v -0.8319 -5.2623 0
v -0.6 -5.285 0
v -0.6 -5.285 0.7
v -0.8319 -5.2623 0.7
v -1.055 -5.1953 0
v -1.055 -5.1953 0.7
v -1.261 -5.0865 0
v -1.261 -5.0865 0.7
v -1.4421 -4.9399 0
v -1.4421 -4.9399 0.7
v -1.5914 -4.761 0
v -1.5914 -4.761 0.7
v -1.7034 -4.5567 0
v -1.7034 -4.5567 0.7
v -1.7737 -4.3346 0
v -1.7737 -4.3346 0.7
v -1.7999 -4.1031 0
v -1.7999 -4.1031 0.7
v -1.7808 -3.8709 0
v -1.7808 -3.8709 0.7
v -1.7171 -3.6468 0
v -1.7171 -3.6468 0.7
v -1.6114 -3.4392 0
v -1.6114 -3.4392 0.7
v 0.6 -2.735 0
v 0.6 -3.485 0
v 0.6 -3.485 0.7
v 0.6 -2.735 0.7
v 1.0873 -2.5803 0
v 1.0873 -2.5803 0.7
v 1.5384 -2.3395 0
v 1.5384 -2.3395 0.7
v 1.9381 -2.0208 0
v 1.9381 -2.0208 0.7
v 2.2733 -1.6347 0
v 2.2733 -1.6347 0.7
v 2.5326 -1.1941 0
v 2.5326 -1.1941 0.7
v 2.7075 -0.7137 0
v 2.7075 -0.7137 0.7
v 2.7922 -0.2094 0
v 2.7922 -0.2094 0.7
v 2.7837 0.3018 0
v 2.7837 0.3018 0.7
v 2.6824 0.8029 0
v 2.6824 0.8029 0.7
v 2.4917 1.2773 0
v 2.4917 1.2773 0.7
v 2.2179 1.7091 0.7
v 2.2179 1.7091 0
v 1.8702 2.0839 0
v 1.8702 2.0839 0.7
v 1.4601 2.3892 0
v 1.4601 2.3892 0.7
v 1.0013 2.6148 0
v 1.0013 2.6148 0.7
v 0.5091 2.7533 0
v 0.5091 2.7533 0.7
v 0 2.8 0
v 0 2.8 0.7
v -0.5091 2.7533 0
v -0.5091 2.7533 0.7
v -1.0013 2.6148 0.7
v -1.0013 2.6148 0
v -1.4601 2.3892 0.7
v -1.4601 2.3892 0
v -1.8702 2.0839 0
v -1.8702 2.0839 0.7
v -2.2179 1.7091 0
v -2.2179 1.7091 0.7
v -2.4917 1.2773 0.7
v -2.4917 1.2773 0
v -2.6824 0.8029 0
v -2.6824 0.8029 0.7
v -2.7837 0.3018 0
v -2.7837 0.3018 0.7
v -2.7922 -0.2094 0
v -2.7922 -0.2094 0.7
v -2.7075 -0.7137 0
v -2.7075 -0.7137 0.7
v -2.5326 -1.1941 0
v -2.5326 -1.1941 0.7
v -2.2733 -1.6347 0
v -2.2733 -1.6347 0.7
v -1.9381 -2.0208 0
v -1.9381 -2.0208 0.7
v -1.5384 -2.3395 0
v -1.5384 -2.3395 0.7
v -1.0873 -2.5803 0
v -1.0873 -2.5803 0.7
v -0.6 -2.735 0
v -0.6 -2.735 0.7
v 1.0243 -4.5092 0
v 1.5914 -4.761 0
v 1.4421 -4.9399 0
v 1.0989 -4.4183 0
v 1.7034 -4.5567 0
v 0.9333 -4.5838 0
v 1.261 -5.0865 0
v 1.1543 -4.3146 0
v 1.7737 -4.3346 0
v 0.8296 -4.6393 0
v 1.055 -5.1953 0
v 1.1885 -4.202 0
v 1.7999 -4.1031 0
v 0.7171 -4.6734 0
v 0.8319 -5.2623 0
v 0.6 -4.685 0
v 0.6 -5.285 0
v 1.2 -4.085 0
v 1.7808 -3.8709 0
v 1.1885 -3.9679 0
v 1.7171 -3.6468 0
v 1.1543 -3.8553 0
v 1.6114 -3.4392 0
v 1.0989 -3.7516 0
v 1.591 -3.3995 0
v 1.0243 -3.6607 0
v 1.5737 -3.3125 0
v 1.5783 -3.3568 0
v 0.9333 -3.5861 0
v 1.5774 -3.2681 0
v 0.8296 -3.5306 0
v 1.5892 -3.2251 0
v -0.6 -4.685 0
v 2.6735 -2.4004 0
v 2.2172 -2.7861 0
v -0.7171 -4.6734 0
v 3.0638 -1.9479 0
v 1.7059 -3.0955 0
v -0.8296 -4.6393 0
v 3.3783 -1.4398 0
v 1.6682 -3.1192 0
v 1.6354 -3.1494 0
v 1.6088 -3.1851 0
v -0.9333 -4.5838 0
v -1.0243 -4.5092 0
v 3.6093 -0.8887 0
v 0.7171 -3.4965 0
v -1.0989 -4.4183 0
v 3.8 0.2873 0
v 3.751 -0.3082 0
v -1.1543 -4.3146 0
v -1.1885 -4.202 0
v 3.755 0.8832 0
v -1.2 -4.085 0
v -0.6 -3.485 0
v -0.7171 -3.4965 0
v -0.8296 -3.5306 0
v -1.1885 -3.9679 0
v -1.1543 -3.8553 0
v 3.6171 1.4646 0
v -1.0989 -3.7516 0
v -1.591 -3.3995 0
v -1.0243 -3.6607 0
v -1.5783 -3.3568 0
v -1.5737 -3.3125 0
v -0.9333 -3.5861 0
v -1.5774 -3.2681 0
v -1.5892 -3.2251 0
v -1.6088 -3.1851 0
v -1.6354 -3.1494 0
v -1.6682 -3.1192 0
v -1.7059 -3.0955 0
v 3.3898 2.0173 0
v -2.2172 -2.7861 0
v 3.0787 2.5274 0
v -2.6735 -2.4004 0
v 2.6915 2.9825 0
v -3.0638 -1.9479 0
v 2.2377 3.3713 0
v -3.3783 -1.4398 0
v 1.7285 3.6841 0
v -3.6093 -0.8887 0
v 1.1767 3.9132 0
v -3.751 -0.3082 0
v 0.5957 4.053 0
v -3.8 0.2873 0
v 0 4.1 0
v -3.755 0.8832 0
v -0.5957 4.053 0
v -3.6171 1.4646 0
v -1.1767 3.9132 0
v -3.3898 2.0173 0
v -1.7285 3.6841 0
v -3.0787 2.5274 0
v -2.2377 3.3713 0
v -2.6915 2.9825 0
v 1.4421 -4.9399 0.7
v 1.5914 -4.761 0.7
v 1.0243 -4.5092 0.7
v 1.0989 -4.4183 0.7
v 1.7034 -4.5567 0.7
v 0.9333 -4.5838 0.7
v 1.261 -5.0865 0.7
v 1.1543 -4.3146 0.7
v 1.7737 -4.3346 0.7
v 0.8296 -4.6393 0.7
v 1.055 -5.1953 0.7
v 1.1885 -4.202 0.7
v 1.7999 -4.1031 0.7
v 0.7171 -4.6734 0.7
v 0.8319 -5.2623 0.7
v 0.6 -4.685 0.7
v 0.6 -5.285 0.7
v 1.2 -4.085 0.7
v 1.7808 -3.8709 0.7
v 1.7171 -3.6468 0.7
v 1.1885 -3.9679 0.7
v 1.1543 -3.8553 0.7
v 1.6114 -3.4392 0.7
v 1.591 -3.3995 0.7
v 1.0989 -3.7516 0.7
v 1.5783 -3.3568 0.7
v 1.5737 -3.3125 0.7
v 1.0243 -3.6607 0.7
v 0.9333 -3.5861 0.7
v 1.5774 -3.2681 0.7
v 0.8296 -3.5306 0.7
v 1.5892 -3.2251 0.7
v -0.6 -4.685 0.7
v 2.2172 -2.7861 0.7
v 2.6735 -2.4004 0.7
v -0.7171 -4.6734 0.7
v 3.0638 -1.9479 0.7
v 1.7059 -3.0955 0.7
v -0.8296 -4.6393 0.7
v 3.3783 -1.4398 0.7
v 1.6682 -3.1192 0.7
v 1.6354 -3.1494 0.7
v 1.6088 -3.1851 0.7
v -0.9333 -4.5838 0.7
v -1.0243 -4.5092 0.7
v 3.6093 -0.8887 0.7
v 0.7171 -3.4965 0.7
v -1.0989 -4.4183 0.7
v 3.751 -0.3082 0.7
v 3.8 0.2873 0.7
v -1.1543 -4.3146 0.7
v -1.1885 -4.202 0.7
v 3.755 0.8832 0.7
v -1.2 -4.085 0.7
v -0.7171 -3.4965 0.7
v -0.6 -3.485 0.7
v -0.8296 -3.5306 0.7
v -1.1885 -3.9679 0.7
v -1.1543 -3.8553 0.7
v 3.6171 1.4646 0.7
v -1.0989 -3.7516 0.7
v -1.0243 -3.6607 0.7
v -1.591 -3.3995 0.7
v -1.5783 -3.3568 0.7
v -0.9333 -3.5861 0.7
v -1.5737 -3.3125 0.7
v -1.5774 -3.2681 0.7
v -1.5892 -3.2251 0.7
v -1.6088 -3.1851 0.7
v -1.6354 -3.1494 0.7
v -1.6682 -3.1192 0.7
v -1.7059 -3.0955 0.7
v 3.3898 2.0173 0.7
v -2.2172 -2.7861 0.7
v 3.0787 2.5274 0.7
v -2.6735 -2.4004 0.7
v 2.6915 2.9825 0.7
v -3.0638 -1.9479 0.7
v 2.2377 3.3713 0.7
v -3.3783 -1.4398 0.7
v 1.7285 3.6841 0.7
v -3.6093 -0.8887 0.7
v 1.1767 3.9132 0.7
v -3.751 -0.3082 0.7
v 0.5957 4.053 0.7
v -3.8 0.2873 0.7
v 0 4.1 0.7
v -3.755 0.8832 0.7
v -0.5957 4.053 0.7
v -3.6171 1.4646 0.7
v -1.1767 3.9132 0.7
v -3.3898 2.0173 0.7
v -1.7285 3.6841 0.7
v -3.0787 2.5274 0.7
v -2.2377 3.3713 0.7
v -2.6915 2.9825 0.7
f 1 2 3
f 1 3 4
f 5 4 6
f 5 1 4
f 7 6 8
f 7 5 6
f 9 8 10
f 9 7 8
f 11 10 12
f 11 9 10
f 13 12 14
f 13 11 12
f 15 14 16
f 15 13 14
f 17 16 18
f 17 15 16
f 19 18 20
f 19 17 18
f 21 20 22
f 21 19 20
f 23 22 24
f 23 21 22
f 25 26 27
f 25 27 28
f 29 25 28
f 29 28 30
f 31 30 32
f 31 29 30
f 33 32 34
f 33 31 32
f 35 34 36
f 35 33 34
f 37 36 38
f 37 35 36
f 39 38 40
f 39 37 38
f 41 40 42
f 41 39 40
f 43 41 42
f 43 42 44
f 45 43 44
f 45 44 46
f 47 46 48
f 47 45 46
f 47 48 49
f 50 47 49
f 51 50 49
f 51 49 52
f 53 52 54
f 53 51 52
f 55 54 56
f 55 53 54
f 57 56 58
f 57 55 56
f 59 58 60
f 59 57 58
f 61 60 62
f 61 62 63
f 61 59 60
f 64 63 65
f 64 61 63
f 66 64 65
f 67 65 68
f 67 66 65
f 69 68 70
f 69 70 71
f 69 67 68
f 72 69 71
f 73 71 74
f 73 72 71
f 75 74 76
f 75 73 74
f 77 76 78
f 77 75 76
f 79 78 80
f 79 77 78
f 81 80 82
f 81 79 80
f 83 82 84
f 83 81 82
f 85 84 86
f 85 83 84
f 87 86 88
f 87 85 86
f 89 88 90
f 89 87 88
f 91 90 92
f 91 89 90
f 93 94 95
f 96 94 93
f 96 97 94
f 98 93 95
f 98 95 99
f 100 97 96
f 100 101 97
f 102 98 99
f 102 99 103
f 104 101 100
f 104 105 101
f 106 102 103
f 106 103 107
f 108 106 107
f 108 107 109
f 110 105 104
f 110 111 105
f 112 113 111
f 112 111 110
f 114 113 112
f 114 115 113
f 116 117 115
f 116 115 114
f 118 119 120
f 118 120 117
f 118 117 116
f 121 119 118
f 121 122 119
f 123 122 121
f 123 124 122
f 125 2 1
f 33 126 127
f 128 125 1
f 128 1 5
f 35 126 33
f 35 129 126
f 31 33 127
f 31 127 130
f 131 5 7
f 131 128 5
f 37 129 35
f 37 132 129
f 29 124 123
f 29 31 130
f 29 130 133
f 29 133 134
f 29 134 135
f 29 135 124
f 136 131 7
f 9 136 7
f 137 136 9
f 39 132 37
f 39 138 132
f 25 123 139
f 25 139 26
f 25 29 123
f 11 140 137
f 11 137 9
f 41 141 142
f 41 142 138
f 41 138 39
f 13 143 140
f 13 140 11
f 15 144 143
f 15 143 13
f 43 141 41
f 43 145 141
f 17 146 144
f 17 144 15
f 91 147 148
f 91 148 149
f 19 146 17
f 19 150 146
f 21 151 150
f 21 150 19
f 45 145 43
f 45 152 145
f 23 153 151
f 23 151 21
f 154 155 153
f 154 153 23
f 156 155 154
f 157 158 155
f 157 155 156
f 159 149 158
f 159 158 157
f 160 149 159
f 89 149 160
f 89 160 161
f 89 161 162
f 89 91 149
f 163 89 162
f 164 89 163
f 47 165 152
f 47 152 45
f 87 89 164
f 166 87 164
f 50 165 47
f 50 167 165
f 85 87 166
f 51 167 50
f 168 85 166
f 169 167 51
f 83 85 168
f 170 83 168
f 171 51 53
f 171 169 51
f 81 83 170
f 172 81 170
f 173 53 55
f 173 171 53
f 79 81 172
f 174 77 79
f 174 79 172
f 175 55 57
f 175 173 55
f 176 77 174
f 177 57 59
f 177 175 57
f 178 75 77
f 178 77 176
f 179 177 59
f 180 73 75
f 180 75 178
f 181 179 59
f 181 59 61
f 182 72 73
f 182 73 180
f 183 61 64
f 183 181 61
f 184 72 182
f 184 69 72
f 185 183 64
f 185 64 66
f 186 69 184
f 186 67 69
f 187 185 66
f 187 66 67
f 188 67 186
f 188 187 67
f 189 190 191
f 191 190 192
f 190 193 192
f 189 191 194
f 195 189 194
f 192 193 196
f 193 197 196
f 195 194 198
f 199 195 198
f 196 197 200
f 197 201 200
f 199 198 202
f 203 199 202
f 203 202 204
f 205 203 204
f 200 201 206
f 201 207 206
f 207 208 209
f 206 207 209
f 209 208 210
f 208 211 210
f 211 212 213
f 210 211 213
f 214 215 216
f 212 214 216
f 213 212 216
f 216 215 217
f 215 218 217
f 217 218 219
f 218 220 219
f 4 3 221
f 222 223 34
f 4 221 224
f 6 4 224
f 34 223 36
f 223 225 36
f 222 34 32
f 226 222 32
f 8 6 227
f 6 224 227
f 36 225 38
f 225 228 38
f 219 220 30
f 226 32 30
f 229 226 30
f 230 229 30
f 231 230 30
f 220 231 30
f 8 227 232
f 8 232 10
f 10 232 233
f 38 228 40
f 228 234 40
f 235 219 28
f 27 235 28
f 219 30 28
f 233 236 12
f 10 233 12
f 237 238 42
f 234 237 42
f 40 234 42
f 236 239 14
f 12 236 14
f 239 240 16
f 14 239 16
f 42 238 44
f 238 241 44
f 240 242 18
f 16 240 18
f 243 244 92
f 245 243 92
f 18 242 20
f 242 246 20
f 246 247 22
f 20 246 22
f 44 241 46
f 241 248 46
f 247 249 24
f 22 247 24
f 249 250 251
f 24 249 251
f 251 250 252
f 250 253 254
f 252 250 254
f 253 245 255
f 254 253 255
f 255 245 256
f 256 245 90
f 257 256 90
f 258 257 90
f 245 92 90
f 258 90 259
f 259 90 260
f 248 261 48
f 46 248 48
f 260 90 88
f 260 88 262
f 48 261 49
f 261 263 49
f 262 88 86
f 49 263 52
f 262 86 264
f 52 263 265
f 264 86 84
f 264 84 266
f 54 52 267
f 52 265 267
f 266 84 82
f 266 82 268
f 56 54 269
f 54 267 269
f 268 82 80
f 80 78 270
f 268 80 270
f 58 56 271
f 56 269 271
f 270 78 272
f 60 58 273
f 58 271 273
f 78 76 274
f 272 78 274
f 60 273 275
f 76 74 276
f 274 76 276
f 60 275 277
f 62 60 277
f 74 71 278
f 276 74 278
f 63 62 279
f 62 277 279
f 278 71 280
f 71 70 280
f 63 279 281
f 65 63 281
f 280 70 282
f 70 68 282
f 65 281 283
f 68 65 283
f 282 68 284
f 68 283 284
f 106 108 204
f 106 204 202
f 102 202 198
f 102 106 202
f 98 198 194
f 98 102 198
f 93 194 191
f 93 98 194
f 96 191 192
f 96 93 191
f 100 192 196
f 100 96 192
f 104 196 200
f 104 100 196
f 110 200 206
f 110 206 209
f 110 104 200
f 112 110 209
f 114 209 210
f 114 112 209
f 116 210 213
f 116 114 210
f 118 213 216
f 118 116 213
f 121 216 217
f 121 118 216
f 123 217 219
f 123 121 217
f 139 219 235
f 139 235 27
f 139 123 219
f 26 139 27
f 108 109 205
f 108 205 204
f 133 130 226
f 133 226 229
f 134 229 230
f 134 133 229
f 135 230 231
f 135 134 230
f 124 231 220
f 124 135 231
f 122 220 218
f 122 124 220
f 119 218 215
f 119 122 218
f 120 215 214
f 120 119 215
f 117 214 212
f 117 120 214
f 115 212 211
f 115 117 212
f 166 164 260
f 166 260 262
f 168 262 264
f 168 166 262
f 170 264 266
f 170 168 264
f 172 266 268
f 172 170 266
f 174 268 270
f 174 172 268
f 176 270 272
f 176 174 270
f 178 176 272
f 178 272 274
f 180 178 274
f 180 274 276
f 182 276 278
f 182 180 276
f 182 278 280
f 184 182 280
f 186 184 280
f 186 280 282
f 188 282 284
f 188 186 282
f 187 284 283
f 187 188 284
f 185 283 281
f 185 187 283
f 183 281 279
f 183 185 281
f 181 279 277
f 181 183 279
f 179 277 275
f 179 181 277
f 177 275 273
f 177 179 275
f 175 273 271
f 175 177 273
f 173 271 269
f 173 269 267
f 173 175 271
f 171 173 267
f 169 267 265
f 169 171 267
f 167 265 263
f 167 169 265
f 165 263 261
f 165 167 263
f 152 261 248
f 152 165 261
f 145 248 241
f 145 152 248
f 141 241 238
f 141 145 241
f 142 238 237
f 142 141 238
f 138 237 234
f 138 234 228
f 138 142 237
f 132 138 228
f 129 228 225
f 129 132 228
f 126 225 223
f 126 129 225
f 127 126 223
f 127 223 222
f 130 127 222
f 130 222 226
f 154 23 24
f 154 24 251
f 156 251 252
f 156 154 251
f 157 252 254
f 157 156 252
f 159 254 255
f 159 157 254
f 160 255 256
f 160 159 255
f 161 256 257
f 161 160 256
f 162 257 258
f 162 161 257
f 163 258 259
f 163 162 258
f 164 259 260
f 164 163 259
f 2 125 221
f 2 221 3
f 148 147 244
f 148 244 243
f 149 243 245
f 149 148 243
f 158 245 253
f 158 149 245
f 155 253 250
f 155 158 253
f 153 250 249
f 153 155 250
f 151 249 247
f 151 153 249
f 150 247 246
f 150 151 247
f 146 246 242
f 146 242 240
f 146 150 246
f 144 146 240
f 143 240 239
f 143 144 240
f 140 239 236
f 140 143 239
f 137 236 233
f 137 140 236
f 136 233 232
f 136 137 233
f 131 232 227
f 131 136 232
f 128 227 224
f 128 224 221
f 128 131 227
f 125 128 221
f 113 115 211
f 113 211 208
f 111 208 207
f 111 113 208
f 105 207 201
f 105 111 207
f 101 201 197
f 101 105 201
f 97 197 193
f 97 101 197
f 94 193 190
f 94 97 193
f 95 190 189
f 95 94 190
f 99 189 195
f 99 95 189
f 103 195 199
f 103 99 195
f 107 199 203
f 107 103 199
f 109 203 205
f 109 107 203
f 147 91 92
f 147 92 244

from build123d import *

# Parameters (mm, degrees)
EXTRUDE_1_DEPTH = 0.7


with BuildPart() as part:
    # Sketch 288 → 拉伸1 (new body)
    with BuildSketch(Plane.XY):
        with BuildLine():
            Line((-0.6, -2.734958866), (-0.6, -3.484958866))
            ThreePointArc((-0.6, -3.484958866), (-1.2, -4.084958866), (-0.6, -4.684958866))
            Line((-0.6, -4.684958866), (-0.6, -5.284958866))
            ThreePointArc((-0.6, -5.284958866), (-1.652367602, -4.661606446), (-1.611408717, -3.439162917))
            ThreePointArc((-1.611408717, -3.439162917), (-1.582288686, -3.246338831), (-1.705946473, -3.095548061))
            ThreePointArc((-1.705946473, -3.095548061), (0, 4.1), (1.705946473, -3.095548061))
            ThreePointArc((1.705946473, -3.095548061), (1.582288686, -3.246338831), (1.611408717, -3.439162917))
            ThreePointArc((1.611408717, -3.439162917), (1.652367602, -4.661606446), (0.6, -5.284958866))
            Line((0.6, -5.284958866), (0.6, -4.684958866))
            ThreePointArc((0.6, -4.684958866), (1.2, -4.084958866), (0.6, -3.484958866))
            Line((0.6, -3.484958866), (0.6, -2.734958866))
            ThreePointArc((0.6, -2.734958866), (0, 2.8), (-0.6, -2.734958866))
        make_face()
    extrude(amount=EXTRUDE_1_DEPTH)


solid = part.part
